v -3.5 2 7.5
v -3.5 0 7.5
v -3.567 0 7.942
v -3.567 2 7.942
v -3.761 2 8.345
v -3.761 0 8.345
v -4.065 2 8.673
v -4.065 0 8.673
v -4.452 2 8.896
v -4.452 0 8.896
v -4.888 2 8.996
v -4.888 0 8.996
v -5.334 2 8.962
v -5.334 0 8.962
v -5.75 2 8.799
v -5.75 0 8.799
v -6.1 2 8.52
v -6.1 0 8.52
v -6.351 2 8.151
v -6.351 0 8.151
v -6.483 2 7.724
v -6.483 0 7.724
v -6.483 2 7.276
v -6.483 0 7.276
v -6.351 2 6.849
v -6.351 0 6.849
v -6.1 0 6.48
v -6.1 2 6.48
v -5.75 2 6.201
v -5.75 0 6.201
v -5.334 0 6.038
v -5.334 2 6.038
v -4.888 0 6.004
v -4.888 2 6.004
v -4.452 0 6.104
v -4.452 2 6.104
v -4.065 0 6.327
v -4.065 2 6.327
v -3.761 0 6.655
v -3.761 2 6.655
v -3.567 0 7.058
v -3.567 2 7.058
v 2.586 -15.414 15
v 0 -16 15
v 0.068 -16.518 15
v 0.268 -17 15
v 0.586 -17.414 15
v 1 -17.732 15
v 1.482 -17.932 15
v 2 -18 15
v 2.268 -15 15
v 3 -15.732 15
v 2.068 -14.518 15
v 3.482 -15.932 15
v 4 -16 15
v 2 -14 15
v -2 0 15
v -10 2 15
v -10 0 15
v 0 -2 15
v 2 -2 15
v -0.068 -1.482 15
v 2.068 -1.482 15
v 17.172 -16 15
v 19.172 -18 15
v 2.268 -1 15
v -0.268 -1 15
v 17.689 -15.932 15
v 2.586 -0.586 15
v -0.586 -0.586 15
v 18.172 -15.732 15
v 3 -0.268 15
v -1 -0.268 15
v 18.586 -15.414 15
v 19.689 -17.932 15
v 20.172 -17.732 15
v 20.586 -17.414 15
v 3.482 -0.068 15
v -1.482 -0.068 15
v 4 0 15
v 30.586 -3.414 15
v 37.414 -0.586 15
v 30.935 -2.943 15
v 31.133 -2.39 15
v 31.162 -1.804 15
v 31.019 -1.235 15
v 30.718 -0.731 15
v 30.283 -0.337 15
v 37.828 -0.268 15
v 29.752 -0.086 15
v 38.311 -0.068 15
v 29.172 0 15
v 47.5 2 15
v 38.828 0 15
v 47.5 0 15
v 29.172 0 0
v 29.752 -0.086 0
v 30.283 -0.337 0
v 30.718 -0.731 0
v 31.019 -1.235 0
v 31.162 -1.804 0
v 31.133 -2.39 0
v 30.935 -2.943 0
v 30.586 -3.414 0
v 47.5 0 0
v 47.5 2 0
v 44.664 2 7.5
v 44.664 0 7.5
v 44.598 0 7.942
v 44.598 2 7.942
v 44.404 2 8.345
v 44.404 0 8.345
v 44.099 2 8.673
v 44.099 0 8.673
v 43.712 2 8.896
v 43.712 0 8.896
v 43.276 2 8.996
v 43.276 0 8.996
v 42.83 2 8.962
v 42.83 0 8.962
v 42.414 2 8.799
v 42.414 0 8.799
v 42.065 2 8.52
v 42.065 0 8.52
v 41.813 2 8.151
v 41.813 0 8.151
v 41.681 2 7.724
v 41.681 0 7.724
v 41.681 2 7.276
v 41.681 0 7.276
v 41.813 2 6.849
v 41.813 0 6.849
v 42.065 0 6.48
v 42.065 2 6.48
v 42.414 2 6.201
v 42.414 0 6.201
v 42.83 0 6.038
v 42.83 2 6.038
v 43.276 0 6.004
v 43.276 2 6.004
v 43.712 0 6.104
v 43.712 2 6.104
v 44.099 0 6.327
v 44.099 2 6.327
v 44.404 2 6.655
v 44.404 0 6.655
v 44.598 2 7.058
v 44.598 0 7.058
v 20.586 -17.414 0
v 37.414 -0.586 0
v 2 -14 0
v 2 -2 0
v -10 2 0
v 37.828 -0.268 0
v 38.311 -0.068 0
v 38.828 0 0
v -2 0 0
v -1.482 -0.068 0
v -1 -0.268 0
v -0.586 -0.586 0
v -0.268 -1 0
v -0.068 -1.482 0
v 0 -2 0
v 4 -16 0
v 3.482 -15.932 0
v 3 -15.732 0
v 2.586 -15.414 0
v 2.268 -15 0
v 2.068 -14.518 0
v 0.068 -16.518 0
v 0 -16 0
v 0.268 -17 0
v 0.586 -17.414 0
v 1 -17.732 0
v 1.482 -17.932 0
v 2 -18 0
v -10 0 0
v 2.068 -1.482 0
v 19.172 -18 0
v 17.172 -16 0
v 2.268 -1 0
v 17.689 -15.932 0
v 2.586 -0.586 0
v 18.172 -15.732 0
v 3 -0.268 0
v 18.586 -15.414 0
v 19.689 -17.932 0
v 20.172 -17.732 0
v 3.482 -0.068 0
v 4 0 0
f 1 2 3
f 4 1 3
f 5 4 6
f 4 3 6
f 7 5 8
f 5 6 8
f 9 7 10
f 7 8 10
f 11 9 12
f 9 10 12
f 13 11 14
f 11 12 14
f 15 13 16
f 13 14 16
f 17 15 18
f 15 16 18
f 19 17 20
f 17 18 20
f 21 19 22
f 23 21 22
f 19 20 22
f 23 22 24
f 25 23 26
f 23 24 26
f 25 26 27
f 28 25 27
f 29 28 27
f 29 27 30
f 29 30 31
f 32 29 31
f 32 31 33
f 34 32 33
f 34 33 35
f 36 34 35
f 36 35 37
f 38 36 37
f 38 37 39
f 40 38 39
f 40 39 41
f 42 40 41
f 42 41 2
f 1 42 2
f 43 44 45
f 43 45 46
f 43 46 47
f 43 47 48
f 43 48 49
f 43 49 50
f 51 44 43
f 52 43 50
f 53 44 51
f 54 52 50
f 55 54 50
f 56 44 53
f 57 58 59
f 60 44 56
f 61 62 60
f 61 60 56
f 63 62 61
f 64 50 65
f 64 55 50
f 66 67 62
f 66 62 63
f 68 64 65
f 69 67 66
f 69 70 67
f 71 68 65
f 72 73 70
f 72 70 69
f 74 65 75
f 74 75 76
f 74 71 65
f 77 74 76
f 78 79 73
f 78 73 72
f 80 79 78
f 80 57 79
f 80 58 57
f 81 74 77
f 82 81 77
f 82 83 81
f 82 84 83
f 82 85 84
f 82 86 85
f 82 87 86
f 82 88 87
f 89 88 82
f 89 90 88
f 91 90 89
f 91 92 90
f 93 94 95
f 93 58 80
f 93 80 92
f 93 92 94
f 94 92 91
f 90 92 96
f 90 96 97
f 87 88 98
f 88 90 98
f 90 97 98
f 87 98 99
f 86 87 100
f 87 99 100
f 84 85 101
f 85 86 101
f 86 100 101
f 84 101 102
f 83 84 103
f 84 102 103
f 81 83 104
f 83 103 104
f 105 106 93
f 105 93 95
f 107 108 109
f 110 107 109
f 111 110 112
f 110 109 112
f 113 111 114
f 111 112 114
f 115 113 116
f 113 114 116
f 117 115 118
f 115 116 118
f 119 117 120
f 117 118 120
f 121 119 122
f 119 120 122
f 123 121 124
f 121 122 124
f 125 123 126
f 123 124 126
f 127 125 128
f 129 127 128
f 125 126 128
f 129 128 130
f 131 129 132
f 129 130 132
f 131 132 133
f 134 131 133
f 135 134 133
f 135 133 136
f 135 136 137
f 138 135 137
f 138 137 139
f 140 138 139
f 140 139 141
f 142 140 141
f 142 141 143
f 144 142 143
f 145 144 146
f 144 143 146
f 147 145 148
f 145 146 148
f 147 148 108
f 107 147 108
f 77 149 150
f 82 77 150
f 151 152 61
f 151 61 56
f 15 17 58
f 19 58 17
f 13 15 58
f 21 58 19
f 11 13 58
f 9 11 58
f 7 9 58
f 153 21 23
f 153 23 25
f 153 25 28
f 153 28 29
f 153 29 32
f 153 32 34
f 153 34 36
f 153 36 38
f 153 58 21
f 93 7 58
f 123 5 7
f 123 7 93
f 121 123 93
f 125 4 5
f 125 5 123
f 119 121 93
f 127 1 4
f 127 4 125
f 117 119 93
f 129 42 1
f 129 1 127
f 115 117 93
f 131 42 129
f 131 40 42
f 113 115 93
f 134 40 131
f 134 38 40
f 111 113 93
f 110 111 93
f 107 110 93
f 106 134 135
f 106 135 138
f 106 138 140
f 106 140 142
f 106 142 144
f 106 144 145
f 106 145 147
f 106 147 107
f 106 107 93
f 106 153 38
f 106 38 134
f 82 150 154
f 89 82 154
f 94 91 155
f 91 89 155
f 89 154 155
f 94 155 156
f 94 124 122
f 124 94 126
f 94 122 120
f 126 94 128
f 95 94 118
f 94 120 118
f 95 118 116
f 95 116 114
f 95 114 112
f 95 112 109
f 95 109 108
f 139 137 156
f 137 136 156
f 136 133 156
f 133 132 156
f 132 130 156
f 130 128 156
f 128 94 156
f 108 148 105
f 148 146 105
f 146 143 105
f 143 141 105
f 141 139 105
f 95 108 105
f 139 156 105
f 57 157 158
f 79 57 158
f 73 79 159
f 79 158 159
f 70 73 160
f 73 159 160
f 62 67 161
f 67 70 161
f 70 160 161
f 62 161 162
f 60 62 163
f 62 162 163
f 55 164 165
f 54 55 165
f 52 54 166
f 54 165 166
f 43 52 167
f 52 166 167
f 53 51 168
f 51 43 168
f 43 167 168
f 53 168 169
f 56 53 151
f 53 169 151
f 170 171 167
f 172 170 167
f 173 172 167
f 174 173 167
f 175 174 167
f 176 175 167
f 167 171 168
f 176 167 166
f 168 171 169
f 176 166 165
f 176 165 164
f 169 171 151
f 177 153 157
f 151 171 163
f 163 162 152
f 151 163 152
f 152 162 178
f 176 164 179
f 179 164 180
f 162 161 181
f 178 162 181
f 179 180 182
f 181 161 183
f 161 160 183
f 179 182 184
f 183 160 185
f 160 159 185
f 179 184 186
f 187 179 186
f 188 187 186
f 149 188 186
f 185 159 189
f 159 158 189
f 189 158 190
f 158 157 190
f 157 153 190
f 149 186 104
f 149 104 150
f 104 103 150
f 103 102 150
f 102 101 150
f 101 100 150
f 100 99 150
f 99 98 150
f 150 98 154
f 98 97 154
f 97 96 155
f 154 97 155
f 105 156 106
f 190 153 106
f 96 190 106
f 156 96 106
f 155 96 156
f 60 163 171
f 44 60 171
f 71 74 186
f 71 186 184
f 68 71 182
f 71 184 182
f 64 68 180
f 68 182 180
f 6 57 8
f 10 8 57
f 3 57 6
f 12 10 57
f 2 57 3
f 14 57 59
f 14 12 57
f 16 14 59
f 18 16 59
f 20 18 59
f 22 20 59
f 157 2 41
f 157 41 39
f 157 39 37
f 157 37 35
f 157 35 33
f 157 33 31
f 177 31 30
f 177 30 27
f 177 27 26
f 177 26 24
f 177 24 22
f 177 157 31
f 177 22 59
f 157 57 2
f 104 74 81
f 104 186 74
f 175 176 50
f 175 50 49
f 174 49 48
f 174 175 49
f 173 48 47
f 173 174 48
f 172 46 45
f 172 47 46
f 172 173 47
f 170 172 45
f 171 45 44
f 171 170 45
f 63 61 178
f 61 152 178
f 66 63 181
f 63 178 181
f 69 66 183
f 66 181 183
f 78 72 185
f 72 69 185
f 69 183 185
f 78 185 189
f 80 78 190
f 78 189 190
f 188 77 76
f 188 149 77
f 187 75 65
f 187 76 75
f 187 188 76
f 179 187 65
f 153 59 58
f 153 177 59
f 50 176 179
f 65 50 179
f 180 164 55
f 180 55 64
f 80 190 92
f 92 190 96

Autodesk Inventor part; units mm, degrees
ref_plane "YZ Plane" through (0, 0, 0) normal (1, 0, 0) x (0, 1, 0)
ref_plane "XZ Plane" through (0, 0, 0) normal (0, 1, 0) x (-1, 0, 0)
ref_plane "XY Plane" through (0, 0, 0) normal (0, 0, 1) x (1, 0, 0)
sketch "Sketch1" plane through (0, 0, 0) normal (0, 0, 1) x (1, 0, 0)
  line L0 (0, -2) -> (0, -16)
  line L1 (2, -18) -> (19.1716, -18)
  line L2 (2, -2) -> (2, -14)
  line L3 (4, -16) -> (17.1716, -16)
  line L4 (20.5858, -17.4142) -> (37.4142, -0.5858)
  line L5 (18.5858, -15.4142) -> (30.5858, -3.4142)
  arc A0 (2, -14) -> (4, -16) centre (4, -14) ccw
  arc A1 (0, -16) -> (2, -18) centre (2, -16) ccw
  arc A2 (19.1716, -18) -> (20.5858, -17.4142) centre (19.1716, -16) ccw
  arc A3 (17.1716, -16) -> (18.5858, -15.4142) centre (17.1716, -14) ccw
  arc A4 (30.5858, -3.4142) -> (29.1716, 0) centre (29.1716, -2) ccw
  arc A5 (38.8284, 0) -> (37.4142, -0.5858) centre (38.8284, -2) ccw
  line L6 (2, -2) -> (2, -2)
  line L7 (-2, 0) -> (-10, 0)
  arc A6 (0, -2) -> (-2, 0) centre (-2, -2) ccw
  line L8 (-10, 0) -> (-10, 2)
  line L9 (-10, 2) -> (47.5, 2)
  line L10 (47.5, 2) -> (47.5, 0)
  arc A7 (4, 0) -> (2, -2) centre (4, -2) ccw
  line L11 (-10, 0) -> (-2, 0)
  line L12 (4, 0) -> (29.1716, 0)
  line L13 (38.8284, 0) -> (47.5, 0)
  line L14 (4, 0) -> (29.1716, 0)
  line L15 (38.8284, 0) -> (47.5, 0)
  line L16 (38.8284, 0) -> (38.8284, 2)
  point P0 (0, 0)
  point P1 (0, 0)
  point P2 (0, -18)
  point P3 (20, -18)
  point P4 (22, -16)
  point P5 (38, 0)
  point P6 (34, 0)
  point P7 (34, 0)
  dimension "d0" = 18
  dimension "d1" = 20
  dimension "d2" = 2
  dimension "d3" = 2
  dimension "d4" = 2
  dimension "d5" = 2
  dimension "d6" = 10
  dimension "d7" = 2
  dimension "d8" = 2
  dimension "d9" = 2
extrude "Extrusion1" add sketch "Sketch1" along normal blind 15
sketch "Sketch2" plane through (38.8284, 0, 0) normal (0, -1, 0) x (1, 0, 0)
  line L0 (8.6716, 0) -> (-48.8284, 0) projected
  line L1 (-48.8284, 0) -> (-48.8284, 5)
  line L2 (-48.8284, 0) -> (-48.8284, 15) projected
  line L3 (-48.8284, 5) -> (-48.8284, 0)
  line L4 (8.6716, 15) -> (-48.8284, 15) projected
  line L5 (-48.8284, 0) -> (-48.8284, 15)
  line L6 (-48.8284, 15) -> (-48.8284, 7.5)
  line L7 (-48.8284, 0) -> (-48.8284, 15) projected
  line L8 (-40.8284, 15) -> (-38.8284, 15) projected
  line L9 (-48.8284, 15) -> (-38.8284, 15)
  line L10 (-38.8284, 15) -> (-43.8284, 15)
  line L11 (-43.8284, 15) -> (-43.8284, 7.5)
  line L12 (-48.8284, 15) -> (-40.8284, 15) projected
  circle A0 centre (-43.8284, 7.5) radius 1.5
  line L13 (-18.2426, 15) -> (-1.4142, 15) projected
  line L14 (8.6716, 15) -> (-1.4142, 15)
  line L15 (-1.4142, 15) -> (4.3358, 15)
  line L16 (0, 15) -> (8.6716, 15) projected
  line L17 (4.3358, 15) -> (4.3358, 7.5)
  circle A1 centre (4.3358, 7.5) radius 1.5
  line L18 (8.6716, 0) -> (8.6716, 15) projected
  line L19 (8.6716, 15) -> (-48.8284, 15)
  line L20 (-48.8284, 15) -> (-48.8284, 0)
  line L21 (-48.8284, 0) -> (8.6716, 0)
  line L22 (8.6716, 0) -> (8.6716, 15)
  point P0 (-38.8284, 0)
  dimension "d12" = 5
  dimension "d13" = 5
  dimension "d19" = 3
  dimension "d20" = 3
extrude "Extrusion2" cut sketch "Sketch2" against normal up to surface (2 mm away) contours A1 | A0
sketch "Sketch3" plane through (-10, 2, 0) normal (0, 1, 0) x (1, 0, 0)
  line L0 (57.5, -15) -> (0, -15) projected
  line L1 (57.5, 0) -> (0, 0) projected
  line L2 (0, -15) -> (0, 0)
  line L3 (0, 0) -> (0, -15) projected
  line L4 (0, -15) -> (0, -7.5)
  line L5 (0, -7.5) -> (3.5, -7.5)
  circle A0 centre (5, -7.5) radius 1.5 projected
  line L6 (5, -7.5) -> (3.5, -7.5)
  circle A1 centre (53.1642, -7.5) radius 1.5 projected
  line L7 (53.1642, -6) -> (53.1642, -7.5)
  line L8 (53.1642, -7.5) -> (5, -7.5)
  line L9 (57.5, 0) -> (57.5, -15) projected
  point P0 (10, 0)
  dimension "d23" = 57.5
  dimension "d24" = 4.3358
properties part number "Motor_shroud"
